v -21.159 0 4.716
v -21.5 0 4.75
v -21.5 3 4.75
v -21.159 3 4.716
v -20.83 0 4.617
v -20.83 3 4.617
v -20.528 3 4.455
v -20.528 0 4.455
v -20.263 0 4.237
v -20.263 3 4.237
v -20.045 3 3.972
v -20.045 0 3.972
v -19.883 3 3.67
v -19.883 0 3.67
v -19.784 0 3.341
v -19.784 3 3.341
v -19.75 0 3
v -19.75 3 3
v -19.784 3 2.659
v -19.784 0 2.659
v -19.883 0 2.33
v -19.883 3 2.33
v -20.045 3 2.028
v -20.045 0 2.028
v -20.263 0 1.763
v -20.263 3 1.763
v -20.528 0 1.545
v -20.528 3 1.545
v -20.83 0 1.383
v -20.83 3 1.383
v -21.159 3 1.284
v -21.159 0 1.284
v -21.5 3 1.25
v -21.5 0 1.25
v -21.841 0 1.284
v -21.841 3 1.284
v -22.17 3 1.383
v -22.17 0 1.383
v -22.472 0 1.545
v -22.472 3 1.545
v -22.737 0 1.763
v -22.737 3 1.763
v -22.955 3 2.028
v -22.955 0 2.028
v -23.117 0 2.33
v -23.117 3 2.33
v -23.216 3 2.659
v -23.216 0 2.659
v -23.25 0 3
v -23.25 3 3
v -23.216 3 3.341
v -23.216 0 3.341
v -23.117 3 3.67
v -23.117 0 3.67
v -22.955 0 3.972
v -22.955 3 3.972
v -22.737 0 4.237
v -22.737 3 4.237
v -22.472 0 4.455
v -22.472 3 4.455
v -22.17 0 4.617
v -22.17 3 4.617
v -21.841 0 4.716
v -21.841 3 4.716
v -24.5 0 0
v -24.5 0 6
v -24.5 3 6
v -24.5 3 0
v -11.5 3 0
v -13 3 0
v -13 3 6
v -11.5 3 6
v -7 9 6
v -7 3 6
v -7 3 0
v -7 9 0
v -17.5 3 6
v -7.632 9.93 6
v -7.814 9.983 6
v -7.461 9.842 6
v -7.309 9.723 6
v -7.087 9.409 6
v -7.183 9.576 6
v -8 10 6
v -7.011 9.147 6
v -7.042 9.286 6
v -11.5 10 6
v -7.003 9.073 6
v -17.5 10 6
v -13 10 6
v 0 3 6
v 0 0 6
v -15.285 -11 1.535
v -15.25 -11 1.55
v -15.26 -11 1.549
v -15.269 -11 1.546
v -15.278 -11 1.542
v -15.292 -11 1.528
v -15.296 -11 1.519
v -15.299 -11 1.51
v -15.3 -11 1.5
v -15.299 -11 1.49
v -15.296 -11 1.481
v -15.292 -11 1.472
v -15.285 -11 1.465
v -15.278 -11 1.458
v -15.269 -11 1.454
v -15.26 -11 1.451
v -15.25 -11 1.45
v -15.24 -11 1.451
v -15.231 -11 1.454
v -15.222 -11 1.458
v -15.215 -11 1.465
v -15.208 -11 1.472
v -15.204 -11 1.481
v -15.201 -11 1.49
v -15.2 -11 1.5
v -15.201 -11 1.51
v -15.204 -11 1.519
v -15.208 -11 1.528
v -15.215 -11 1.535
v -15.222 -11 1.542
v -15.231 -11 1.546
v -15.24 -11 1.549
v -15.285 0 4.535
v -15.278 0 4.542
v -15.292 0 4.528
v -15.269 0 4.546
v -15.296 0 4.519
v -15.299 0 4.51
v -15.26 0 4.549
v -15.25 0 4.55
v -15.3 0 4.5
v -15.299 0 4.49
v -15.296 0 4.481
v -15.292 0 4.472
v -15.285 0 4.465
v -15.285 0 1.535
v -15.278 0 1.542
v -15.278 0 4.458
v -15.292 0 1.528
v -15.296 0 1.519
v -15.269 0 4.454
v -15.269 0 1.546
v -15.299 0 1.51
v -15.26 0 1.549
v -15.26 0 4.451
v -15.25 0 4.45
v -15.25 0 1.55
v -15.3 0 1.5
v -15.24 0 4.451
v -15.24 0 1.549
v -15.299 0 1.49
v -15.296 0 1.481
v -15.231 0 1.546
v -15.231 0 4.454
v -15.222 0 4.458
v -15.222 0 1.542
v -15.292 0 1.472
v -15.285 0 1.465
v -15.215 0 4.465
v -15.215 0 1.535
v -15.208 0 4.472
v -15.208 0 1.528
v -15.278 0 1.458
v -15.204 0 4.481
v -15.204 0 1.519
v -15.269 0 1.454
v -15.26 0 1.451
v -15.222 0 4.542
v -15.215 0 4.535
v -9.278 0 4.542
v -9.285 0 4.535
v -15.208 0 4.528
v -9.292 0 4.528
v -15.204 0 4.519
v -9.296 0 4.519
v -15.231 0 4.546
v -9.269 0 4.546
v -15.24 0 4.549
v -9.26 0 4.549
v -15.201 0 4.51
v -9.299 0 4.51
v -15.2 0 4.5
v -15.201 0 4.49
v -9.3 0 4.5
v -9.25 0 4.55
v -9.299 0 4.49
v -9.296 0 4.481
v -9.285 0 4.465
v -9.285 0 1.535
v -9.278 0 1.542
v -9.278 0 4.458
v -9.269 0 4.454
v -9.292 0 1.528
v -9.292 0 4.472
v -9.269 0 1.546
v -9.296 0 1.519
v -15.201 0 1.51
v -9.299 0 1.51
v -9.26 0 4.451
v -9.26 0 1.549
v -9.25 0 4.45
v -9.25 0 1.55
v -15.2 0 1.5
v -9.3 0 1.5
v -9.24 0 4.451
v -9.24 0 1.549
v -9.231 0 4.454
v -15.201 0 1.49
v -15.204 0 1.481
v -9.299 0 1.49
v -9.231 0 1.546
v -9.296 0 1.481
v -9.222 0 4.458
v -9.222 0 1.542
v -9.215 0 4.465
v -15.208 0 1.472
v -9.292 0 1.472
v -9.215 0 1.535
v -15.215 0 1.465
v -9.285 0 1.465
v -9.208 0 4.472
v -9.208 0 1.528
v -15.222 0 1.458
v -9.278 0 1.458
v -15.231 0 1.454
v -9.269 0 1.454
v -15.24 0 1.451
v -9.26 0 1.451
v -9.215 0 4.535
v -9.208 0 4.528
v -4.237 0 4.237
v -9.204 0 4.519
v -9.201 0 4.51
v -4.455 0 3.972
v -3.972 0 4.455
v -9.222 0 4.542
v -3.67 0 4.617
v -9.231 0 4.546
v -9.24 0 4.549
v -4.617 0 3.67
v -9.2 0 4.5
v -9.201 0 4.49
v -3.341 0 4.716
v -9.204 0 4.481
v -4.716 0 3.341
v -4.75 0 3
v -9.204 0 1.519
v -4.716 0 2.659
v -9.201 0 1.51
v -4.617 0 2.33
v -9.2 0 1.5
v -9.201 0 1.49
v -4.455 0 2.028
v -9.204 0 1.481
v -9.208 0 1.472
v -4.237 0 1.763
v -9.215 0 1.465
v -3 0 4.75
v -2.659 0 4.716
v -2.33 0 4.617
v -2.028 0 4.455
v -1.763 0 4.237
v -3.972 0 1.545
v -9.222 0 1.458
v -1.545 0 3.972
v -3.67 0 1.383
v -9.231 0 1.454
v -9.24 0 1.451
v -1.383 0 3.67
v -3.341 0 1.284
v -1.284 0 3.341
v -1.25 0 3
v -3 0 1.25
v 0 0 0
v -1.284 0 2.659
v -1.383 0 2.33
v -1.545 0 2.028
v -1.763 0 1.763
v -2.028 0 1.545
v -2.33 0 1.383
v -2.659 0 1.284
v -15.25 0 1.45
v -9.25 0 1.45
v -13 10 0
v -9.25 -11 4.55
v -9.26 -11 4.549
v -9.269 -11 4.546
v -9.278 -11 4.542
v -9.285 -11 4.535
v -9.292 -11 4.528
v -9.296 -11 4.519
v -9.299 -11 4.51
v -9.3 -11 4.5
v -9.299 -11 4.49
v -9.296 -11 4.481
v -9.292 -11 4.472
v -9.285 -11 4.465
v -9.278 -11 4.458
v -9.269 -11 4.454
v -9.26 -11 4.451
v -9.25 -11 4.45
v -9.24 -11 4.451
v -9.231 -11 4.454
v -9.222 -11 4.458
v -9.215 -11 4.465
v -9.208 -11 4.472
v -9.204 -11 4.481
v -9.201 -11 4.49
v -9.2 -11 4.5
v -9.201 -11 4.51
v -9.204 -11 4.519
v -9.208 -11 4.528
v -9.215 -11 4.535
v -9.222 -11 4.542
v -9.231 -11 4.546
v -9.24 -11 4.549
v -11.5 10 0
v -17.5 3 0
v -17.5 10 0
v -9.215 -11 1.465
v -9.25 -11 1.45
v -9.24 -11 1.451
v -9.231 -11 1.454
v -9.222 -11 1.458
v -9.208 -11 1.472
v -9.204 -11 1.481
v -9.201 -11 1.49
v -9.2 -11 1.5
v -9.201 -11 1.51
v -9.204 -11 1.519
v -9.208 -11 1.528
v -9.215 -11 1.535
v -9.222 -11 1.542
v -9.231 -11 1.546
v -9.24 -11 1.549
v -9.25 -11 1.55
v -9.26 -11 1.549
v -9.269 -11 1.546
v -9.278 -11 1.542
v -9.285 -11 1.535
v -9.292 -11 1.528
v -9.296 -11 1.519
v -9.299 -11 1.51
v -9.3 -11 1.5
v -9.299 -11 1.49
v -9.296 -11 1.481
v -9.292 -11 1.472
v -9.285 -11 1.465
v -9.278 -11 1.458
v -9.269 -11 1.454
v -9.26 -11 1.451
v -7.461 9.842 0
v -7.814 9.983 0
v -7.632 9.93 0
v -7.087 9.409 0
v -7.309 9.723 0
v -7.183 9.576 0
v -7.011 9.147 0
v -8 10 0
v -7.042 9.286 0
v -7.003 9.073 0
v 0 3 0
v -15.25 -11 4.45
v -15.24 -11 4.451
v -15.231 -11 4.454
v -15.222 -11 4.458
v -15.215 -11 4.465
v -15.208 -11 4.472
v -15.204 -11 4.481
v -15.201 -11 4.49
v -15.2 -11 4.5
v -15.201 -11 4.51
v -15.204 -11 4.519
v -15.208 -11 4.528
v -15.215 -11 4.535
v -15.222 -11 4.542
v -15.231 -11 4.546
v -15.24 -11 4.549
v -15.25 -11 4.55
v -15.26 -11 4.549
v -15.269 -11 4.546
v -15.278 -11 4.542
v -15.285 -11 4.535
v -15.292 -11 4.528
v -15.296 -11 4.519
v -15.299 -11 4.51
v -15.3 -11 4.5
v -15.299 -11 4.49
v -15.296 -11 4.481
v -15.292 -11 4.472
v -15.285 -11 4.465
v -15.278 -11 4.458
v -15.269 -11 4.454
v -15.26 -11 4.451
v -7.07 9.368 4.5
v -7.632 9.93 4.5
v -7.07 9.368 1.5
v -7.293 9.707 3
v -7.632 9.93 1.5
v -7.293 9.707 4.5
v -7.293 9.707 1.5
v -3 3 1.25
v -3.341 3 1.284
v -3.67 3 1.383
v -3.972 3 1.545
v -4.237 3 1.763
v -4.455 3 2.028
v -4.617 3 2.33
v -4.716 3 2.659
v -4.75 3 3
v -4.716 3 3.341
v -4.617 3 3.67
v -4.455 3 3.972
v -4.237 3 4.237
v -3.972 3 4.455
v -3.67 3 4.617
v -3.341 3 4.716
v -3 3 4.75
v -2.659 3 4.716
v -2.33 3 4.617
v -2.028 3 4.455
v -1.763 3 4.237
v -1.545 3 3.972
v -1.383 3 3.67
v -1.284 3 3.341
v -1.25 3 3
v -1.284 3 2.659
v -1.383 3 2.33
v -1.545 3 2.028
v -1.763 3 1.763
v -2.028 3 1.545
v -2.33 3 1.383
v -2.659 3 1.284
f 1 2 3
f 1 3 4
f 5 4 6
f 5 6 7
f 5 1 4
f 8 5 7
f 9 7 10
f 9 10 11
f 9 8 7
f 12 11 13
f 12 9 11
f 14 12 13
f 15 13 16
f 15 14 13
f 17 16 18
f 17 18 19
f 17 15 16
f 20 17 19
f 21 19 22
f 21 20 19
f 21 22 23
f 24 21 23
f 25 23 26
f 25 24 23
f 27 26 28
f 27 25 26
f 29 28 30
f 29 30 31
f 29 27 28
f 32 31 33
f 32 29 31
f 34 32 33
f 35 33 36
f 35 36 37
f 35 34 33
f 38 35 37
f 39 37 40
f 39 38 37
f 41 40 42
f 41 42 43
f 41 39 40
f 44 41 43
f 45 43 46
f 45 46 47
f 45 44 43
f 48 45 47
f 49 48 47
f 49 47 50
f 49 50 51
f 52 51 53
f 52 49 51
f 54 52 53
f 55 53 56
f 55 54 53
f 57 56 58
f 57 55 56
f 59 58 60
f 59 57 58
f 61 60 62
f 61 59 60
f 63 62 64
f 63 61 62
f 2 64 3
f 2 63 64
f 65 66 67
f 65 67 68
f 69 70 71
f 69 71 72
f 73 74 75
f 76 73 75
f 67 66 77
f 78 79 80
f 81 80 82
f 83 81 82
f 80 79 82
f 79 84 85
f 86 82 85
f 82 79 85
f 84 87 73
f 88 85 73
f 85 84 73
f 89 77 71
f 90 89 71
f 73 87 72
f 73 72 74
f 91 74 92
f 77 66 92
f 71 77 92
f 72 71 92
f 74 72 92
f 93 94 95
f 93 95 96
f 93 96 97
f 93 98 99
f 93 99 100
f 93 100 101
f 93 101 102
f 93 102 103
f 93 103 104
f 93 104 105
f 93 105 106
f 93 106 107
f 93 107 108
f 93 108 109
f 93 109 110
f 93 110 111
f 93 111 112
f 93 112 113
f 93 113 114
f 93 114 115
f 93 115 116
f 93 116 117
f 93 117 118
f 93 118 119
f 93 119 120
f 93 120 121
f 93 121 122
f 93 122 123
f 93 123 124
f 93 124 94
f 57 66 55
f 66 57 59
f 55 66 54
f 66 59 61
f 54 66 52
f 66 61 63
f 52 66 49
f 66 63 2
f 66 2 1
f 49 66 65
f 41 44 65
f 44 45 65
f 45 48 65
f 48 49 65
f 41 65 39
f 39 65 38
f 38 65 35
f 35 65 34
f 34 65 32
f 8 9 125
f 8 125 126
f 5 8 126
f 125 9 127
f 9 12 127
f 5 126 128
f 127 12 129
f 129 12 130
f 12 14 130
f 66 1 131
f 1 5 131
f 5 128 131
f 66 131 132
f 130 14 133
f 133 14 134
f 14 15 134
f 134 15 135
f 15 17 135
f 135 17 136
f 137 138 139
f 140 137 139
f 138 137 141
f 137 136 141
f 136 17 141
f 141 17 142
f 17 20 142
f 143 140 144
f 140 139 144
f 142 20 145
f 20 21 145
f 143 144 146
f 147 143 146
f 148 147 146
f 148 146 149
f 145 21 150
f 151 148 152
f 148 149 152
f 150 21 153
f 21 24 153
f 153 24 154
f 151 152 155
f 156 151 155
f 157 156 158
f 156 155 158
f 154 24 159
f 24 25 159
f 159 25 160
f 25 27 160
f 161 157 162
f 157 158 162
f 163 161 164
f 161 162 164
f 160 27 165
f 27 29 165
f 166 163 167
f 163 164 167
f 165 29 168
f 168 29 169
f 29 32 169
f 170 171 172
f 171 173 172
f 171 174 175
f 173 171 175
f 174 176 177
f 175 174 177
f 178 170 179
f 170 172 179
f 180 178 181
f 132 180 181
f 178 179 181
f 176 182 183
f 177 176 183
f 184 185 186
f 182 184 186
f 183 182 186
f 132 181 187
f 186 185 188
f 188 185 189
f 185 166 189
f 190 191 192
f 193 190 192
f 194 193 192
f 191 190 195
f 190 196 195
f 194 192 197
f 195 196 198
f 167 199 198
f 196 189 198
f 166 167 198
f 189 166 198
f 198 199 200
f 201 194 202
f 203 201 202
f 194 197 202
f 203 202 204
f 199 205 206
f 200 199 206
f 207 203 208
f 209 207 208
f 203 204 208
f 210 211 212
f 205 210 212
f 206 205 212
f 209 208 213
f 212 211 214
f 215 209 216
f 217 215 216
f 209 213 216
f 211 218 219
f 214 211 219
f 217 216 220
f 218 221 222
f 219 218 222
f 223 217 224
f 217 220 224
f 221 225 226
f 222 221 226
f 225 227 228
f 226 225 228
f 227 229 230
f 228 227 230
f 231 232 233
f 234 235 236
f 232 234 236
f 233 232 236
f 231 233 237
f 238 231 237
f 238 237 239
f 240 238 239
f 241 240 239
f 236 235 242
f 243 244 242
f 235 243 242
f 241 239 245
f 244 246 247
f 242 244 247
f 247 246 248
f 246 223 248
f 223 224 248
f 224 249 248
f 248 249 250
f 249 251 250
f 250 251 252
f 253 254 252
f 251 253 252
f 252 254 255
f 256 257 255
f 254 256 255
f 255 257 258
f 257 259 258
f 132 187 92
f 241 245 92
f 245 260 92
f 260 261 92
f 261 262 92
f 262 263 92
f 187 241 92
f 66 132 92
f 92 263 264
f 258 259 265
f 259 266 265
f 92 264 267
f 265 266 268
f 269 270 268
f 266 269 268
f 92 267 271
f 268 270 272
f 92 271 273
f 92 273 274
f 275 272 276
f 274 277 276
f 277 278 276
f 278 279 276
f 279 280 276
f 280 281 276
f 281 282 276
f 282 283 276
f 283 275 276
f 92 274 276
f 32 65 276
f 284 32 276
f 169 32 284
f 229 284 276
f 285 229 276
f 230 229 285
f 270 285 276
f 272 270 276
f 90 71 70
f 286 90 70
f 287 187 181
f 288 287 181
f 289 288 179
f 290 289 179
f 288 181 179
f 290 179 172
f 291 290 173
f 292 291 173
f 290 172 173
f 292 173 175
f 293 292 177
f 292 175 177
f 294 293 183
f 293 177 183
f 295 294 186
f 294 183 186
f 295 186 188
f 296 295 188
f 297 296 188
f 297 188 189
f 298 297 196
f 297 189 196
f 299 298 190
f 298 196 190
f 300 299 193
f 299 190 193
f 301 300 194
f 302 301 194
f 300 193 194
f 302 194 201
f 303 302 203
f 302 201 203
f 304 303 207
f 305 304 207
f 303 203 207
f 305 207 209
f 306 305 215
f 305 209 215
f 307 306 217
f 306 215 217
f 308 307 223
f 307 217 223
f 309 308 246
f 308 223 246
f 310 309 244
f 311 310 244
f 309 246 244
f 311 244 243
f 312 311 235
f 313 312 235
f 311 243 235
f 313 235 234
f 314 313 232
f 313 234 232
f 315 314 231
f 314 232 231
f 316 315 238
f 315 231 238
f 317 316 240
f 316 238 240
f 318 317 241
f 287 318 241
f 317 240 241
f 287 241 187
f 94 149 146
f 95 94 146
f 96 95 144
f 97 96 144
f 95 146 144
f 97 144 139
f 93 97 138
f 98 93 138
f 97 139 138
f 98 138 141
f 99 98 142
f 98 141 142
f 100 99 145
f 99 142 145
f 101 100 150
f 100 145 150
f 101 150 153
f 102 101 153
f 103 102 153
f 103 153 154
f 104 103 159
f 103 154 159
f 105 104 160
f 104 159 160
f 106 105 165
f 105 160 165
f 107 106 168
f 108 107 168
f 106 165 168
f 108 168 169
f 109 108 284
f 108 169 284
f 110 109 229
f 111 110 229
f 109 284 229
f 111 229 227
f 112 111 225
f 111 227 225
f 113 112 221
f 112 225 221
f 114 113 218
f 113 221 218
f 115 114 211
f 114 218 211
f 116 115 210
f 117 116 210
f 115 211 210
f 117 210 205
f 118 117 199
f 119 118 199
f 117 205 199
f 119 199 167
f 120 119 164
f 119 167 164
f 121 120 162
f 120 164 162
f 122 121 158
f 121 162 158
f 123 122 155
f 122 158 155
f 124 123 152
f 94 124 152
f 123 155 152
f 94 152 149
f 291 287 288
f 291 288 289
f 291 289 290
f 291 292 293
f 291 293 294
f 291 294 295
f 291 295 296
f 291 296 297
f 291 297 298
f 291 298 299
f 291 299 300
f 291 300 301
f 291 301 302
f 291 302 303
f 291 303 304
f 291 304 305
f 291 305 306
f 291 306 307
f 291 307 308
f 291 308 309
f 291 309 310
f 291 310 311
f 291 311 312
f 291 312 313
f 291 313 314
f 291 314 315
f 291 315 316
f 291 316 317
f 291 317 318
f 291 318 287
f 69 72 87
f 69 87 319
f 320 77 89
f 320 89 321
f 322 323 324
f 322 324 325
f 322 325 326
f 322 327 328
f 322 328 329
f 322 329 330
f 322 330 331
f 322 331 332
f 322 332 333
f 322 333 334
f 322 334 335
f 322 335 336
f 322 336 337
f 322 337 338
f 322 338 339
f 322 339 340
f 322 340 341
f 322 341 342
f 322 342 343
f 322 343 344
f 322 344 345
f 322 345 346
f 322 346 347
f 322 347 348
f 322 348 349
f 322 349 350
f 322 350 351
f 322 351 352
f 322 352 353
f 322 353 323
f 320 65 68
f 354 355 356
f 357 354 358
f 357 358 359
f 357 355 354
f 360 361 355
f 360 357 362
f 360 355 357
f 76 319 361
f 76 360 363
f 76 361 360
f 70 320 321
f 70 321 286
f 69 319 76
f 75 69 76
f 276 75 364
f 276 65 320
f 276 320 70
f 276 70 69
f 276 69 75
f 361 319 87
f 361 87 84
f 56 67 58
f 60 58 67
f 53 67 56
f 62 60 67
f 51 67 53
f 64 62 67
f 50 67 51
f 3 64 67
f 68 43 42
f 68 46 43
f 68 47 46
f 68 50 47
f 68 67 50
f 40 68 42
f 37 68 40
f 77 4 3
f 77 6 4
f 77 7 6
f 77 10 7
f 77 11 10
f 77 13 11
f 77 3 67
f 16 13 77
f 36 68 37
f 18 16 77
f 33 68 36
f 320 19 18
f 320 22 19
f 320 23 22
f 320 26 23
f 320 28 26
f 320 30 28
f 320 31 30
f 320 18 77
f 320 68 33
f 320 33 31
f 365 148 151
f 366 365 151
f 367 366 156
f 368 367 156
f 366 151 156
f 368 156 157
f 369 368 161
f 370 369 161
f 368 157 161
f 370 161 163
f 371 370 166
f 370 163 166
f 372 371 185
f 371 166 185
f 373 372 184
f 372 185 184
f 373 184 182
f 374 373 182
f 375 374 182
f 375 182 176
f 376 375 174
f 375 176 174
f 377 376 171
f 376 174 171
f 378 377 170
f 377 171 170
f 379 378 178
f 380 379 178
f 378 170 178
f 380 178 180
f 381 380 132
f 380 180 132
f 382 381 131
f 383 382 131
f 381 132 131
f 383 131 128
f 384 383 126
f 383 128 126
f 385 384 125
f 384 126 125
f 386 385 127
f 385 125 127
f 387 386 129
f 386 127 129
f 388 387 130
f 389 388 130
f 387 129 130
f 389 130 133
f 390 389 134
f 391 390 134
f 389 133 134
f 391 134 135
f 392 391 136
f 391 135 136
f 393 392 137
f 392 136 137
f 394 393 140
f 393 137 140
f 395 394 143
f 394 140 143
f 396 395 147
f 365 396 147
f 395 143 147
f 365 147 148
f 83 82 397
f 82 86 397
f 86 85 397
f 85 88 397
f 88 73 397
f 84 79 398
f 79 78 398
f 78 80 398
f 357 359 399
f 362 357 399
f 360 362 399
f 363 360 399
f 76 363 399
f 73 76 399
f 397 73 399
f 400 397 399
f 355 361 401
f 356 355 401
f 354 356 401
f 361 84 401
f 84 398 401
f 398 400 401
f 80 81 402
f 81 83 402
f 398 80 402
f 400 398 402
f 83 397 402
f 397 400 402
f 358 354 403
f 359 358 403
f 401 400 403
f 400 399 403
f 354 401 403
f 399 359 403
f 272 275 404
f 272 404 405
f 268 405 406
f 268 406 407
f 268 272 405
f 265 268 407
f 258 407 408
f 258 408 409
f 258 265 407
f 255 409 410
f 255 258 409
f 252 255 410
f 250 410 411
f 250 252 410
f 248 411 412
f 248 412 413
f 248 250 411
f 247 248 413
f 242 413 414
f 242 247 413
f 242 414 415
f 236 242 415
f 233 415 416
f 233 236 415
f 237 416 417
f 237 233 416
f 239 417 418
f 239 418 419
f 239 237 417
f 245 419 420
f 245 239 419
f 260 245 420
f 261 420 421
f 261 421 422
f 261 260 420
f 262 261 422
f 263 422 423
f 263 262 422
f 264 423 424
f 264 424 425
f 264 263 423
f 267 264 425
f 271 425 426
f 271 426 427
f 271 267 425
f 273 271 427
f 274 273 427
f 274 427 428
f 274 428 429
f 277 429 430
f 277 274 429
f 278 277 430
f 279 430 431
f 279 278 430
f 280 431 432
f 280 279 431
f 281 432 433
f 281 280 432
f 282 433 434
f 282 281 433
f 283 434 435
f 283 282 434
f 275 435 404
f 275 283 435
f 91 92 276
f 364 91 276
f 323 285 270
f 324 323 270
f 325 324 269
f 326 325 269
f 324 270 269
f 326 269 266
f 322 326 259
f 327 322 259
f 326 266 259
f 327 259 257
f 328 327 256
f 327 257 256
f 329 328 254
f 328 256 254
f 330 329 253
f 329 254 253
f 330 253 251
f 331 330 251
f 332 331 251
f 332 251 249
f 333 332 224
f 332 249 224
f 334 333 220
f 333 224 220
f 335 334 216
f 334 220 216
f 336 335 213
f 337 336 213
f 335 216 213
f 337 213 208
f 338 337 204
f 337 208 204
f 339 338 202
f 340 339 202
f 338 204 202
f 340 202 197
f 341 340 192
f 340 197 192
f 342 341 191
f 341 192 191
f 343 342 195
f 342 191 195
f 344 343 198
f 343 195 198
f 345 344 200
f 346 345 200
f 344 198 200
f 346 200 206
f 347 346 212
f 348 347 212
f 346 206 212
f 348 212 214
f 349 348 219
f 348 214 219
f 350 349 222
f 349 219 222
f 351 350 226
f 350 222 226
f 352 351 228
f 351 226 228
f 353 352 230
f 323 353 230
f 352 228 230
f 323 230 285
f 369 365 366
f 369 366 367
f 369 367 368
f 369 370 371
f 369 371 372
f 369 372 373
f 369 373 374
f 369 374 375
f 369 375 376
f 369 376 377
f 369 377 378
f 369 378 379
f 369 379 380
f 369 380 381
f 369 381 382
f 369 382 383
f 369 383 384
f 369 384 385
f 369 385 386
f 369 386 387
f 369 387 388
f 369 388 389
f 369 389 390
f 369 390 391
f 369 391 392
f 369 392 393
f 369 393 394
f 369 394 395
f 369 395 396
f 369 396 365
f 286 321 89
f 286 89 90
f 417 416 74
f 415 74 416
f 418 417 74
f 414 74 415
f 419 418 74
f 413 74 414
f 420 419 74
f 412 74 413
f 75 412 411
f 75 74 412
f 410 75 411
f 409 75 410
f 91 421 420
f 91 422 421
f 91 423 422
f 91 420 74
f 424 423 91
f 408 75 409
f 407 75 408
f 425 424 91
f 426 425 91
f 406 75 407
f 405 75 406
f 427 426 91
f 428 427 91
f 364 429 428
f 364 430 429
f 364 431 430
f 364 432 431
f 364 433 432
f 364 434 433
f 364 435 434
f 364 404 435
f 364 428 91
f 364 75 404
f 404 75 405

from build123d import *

# Parameters (mm, degrees)
CROQUIS1_W              = 24.5
CROQUIS1_H              = 6
CROQUIS1_R              = 1.75
SALIENTE_EXTRUIR1_DEPTH = 3
CROQUIS2_W              = 4.5
CROQUIS2_H              = 6
SALIENTE_EXTRUIR2_DEPTH = 7
REDONDEO1_SIZE          = 1
CROQUIS3_R              = 0.05
SALIENTE_EXTRUIR3_DEPTH = 11


with BuildPart() as part:
    # Croquis1 → Saliente-Extruir1 (new body)
    with BuildSketch(Plane(origin=(0, 0, 0), x_dir=(1, 0, 0), z_dir=(0, 1, 0))):
        with Locations((-12.25, -3)):
            Rectangle(CROQUIS1_W, CROQUIS1_H)
        with Locations(Location((-21.5, -3, 0), (0, 0, 270))):
            Circle(CROQUIS1_R, mode=Mode.SUBTRACT)
        with Locations(Location((-3, -3, 0), (0, 0, 90))):
            Circle(CROQUIS1_R, mode=Mode.SUBTRACT)
    extrude(amount=SALIENTE_EXTRUIR1_DEPTH)

    # Croquis2 → Saliente-Extruir2 (add)
    with BuildSketch(Plane(origin=(0, 3, 0), x_dir=(1, 0, 0), z_dir=(0, 1, 0))):
        with Locations((-15.25, -3)):
            Rectangle(CROQUIS2_W, CROQUIS2_H)
        with Locations((-9.25, -3)):
            Rectangle(CROQUIS2_W, CROQUIS2_H)
    extrude(amount=SALIENTE_EXTRUIR2_DEPTH)

    # Redondeo1
    # a fillet whose section is not a circle: 1 mm, written as the material it takes off along each edge
    with BuildSketch(Plane(origin=(-7, 10, -2.5), x_dir=(0, -1, 0), z_dir=(0, 0, 1))) as redondeo1_piece_1:
        with BuildLine():
            Bezier((REDONDEO1_SIZE, 0), (0, 0), (0, -REDONDEO1_SIZE), weights=[1, 0.707106781, 1])
            Line((0, -REDONDEO1_SIZE), (0, 0))
            Line((0, 0), (REDONDEO1_SIZE, 0))
        make_face()
    extrude(amount=11, mode=Mode.SUBTRACT)

    # Croquis3 → Saliente-Extruir3 (add)
    with BuildSketch(Plane.XZ):
        with Locations(Location((-15.25, 4.5, 0), (0, 0, 270))):
            Circle(CROQUIS3_R)
        with Locations(Location((-15.25, 1.5, 0), (0, 0, 90))):
            Circle(CROQUIS3_R)
        with Locations(Location((-9.25, 4.5, 0), (0, 0, 90))):
            Circle(CROQUIS3_R)
        with Locations(Location((-9.25, 1.5, 0), (0, 0, 270))):
            Circle(CROQUIS3_R)
    extrude(amount=SALIENTE_EXTRUIR3_DEPTH)


solid = part.part
